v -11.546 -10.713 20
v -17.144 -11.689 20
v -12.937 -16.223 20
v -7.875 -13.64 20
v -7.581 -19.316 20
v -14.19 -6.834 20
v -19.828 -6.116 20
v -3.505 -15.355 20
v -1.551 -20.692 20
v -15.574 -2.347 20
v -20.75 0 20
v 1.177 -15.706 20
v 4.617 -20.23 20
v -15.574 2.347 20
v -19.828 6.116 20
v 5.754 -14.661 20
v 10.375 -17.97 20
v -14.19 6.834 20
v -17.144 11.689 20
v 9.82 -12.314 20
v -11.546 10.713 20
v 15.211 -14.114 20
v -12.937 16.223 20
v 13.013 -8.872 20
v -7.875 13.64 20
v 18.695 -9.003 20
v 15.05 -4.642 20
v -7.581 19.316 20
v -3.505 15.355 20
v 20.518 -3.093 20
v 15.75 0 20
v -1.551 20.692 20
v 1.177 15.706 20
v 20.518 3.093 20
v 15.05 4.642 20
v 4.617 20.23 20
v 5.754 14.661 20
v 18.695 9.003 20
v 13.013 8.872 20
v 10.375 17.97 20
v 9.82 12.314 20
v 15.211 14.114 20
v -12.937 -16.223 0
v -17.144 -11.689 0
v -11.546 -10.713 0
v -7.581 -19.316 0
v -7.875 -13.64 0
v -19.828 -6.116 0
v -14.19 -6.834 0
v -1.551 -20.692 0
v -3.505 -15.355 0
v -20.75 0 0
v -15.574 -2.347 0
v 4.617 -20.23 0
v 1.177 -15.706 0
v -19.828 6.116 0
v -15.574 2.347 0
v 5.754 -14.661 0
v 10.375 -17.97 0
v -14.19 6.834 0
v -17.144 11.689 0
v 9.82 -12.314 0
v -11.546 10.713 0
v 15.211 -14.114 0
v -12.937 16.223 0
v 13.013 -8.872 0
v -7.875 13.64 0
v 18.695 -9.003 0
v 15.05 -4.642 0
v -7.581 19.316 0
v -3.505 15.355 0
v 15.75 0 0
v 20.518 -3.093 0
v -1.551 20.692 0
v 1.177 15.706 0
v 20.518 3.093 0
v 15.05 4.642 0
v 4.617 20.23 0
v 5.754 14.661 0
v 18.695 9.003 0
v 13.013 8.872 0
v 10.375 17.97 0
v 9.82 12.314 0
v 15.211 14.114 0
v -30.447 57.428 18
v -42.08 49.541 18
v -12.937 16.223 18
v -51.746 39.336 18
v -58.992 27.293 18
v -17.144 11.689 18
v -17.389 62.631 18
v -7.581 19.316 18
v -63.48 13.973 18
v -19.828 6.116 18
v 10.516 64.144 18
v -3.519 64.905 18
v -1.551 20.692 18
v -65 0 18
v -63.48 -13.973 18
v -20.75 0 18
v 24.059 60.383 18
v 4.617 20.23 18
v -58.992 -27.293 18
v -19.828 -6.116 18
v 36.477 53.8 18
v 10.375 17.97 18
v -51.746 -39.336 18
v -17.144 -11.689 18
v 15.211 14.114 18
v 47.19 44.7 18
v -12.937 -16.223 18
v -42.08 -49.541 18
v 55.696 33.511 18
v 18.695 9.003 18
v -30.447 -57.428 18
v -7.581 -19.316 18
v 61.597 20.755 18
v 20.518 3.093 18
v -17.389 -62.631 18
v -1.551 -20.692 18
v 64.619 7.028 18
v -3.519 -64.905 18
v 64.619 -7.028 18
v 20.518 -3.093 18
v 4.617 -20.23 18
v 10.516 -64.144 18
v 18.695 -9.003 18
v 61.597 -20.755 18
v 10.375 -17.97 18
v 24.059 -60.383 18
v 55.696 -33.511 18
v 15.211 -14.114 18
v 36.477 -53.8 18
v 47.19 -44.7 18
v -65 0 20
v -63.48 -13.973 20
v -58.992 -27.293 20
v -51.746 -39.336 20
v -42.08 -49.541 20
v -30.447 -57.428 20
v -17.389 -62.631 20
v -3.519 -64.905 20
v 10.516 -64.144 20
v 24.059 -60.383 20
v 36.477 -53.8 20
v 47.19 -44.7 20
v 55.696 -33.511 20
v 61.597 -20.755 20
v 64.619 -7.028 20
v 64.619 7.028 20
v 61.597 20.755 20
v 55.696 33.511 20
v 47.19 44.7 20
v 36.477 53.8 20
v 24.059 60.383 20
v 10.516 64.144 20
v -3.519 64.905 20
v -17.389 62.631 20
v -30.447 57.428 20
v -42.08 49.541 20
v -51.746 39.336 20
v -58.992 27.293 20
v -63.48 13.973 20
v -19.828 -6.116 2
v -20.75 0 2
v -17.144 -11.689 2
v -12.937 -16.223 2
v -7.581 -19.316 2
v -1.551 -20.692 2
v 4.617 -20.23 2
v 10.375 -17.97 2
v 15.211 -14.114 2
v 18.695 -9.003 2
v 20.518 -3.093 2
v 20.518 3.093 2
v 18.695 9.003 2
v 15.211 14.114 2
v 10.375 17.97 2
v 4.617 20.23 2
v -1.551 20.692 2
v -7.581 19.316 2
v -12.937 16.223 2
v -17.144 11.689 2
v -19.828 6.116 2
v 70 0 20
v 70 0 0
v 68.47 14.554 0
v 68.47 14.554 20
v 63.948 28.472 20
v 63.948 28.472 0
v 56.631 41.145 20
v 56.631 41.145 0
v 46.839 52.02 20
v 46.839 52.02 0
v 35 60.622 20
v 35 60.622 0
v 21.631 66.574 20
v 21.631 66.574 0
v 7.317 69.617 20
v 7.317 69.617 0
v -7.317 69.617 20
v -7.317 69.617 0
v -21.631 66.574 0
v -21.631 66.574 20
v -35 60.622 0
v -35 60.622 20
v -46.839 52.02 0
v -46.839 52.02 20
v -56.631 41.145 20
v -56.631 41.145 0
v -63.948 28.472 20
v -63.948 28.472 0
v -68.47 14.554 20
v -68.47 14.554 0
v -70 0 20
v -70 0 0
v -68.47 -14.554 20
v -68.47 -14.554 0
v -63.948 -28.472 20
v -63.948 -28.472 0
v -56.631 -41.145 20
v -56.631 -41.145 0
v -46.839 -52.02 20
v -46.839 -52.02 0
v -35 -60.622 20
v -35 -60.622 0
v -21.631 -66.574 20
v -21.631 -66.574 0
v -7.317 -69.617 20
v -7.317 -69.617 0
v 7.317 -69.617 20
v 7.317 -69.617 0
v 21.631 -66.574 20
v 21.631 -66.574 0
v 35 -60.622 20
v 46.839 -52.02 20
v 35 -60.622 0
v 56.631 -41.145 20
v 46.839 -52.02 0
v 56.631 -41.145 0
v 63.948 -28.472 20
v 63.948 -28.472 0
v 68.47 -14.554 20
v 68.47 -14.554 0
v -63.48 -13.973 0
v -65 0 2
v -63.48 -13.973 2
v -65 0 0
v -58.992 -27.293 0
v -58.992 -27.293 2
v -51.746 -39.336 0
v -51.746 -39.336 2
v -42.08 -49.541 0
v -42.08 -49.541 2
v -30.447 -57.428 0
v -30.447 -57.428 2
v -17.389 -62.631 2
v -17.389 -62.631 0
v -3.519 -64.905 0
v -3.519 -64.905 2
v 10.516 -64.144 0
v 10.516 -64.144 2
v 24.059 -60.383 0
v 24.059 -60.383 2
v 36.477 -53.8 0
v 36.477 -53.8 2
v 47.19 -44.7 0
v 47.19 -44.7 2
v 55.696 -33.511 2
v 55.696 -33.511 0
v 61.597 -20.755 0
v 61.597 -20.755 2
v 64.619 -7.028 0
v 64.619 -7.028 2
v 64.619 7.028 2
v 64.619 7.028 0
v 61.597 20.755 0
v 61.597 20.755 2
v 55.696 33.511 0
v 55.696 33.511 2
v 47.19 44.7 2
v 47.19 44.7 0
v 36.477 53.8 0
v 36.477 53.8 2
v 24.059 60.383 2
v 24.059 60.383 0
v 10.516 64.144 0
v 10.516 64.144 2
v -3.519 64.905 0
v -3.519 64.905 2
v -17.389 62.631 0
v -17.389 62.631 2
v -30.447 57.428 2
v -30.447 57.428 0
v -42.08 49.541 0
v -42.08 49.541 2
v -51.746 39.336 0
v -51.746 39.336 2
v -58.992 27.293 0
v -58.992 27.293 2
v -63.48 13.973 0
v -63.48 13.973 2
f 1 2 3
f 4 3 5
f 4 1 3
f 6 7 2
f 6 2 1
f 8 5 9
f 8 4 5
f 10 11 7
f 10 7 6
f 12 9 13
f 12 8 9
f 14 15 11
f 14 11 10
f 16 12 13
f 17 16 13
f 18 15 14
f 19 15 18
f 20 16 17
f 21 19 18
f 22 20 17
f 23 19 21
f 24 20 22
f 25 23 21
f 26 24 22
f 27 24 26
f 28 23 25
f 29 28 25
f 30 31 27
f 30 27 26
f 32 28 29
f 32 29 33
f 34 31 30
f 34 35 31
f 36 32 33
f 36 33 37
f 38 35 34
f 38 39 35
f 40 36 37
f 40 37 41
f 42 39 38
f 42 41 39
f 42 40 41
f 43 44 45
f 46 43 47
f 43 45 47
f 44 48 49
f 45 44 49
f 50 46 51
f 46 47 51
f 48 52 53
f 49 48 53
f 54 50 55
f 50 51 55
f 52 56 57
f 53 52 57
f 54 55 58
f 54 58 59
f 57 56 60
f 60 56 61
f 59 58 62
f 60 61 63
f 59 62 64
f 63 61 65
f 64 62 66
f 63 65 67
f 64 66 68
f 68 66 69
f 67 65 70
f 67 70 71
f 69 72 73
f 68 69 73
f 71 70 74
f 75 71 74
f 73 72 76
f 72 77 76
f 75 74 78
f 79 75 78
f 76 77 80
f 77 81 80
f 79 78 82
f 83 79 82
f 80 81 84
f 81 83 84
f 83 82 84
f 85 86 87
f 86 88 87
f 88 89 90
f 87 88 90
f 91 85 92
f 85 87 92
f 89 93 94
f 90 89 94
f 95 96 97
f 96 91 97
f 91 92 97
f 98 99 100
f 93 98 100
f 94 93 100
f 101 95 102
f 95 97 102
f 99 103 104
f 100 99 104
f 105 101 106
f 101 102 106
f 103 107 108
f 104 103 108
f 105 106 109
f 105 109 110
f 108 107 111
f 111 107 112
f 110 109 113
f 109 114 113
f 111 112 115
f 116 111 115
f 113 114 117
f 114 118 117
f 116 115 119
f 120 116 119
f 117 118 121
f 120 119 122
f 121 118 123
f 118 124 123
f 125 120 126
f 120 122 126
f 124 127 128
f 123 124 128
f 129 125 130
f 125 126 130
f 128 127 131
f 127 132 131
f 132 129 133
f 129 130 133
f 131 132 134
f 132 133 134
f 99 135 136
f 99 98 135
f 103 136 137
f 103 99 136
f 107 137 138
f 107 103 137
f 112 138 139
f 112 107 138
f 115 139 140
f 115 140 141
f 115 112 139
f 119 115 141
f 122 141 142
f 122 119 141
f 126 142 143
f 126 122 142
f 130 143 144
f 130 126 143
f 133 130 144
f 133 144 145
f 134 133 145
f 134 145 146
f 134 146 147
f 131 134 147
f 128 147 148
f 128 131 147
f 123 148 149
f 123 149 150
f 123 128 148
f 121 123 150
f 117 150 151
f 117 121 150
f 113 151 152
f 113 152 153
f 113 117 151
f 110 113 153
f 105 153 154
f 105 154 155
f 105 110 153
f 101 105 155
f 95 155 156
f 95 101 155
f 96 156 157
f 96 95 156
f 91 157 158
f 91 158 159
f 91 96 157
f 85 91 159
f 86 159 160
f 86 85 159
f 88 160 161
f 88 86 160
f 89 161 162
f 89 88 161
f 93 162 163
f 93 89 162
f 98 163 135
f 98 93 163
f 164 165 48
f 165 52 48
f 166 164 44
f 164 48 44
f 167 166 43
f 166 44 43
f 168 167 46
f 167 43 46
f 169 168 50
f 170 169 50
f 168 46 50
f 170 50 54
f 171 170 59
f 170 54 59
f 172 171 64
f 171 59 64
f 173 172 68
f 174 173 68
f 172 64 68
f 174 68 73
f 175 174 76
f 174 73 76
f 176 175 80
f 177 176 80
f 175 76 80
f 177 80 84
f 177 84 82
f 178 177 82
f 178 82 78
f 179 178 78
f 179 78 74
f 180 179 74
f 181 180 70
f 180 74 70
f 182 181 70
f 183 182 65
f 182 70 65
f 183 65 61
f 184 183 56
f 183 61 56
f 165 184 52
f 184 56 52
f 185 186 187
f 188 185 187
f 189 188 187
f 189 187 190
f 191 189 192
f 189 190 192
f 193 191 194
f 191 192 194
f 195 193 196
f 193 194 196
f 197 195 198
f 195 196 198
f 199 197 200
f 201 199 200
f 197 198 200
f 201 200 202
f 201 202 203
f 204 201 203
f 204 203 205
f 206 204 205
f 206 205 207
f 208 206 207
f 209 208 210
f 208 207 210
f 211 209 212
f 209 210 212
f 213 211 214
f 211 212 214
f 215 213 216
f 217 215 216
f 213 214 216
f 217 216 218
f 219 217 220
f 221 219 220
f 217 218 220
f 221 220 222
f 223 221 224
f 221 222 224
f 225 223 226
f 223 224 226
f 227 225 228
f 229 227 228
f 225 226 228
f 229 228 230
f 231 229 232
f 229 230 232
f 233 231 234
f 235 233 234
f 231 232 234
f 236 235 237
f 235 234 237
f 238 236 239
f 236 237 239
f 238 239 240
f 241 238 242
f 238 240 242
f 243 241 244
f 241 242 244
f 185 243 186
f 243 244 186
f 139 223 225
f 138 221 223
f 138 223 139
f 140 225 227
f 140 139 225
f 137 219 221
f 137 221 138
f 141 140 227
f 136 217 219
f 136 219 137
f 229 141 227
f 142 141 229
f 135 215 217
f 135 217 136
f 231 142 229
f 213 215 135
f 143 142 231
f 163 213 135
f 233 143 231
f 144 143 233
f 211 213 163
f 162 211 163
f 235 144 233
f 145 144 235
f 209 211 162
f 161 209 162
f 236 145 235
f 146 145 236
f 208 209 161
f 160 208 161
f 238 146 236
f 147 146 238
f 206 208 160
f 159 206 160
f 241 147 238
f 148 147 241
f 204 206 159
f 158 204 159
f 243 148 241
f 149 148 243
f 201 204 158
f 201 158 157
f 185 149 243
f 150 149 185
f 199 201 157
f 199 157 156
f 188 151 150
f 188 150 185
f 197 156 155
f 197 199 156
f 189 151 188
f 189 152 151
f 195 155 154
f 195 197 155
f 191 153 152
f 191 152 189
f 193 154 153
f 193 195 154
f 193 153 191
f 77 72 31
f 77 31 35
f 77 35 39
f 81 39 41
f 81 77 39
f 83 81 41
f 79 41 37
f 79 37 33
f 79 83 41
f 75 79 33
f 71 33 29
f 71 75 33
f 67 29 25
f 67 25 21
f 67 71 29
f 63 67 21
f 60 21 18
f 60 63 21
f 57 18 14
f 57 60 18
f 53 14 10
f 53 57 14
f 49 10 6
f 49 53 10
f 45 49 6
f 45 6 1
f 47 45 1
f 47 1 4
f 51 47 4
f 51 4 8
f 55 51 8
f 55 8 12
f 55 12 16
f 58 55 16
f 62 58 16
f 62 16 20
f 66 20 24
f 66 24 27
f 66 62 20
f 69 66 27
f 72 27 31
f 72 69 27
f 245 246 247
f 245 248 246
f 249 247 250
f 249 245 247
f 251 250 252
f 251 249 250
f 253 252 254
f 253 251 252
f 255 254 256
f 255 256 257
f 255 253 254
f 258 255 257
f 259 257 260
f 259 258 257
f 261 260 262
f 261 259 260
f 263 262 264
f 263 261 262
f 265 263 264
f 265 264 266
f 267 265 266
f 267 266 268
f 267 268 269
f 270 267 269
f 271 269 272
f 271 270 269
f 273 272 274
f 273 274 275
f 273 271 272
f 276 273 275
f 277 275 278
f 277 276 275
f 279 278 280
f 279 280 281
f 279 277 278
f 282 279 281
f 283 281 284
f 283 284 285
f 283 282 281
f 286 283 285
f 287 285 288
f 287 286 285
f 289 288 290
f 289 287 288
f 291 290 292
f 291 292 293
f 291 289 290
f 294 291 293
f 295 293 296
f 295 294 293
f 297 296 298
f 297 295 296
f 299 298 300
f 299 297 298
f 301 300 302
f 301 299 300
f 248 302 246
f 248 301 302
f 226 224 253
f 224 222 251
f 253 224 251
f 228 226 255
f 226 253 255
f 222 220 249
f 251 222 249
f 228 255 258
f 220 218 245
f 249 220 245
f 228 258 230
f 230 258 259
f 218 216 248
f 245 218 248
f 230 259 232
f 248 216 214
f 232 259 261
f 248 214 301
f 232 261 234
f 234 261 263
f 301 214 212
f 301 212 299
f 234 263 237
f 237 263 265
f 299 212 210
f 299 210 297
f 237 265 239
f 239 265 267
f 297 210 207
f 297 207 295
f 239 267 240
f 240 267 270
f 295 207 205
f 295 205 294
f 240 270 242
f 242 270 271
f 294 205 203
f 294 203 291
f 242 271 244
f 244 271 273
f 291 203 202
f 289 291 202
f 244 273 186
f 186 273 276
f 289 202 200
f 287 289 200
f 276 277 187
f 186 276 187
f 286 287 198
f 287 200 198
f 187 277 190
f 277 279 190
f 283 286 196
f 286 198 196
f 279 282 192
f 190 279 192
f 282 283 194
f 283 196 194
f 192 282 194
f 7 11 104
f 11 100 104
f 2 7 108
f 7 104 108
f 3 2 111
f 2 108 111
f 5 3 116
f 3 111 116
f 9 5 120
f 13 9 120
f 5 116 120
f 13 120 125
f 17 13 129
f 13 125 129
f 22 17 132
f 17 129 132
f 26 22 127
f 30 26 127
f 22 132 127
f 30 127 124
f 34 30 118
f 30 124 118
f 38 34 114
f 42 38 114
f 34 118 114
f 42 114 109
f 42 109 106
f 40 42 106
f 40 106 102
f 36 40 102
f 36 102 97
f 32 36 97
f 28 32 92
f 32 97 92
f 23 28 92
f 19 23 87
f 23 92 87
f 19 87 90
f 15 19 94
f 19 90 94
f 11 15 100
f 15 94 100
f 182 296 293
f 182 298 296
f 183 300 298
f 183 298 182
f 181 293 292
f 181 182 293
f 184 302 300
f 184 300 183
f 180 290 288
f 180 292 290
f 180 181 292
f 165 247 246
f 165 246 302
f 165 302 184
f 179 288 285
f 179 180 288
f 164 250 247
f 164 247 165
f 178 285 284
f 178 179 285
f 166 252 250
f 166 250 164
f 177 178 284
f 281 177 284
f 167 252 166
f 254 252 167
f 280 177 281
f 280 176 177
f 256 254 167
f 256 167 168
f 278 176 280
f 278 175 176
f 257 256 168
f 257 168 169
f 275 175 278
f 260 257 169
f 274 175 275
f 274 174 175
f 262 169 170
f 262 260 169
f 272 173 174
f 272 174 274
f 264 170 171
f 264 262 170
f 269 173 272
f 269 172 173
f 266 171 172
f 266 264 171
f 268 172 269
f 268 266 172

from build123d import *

# Parameters (mm, degrees)
SKIZZE1_R                       = 70
SKIZZE1_R_2                     = 15.75
AUFSATZ_LINEAR_AUSTRAGEN1_DEPTH = 20
SKIZZE2_W                       = 2
SKIZZE2_H                       = 44.25


with BuildPart() as part:
    # Skizze1 → Aufsatz-Linear austragen1 (new body)
    with BuildSketch(Plane.XY):
        Circle(SKIZZE1_R)
        Circle(SKIZZE1_R_2, mode=Mode.SUBTRACT)
    extrude(amount=AUFSATZ_LINEAR_AUSTRAGEN1_DEPTH)

    # Skizze2 → Schnitt-Rotation1 (revolve, cut)
    with BuildSketch(Plane(origin=(0, 0, 0), x_dir=(0, 0, -1), z_dir=(1, 0, 0)), mode=Mode.PRIVATE) as schnitt_rotation1_sk:
        with Locations((-19, 42.875)):
            Rectangle(SKIZZE2_W, SKIZZE2_H)
        with Locations((-1, 42.875)):
            Rectangle(SKIZZE2_W, SKIZZE2_H)
    revolve(schnitt_rotation1_sk.sketch.rotate(Axis((0, 0, 0), (0, 0, 1)), 90), axis=Axis((0, 0, 0), (0, 0, 1)), mode=Mode.SUBTRACT)


solid = part.part
